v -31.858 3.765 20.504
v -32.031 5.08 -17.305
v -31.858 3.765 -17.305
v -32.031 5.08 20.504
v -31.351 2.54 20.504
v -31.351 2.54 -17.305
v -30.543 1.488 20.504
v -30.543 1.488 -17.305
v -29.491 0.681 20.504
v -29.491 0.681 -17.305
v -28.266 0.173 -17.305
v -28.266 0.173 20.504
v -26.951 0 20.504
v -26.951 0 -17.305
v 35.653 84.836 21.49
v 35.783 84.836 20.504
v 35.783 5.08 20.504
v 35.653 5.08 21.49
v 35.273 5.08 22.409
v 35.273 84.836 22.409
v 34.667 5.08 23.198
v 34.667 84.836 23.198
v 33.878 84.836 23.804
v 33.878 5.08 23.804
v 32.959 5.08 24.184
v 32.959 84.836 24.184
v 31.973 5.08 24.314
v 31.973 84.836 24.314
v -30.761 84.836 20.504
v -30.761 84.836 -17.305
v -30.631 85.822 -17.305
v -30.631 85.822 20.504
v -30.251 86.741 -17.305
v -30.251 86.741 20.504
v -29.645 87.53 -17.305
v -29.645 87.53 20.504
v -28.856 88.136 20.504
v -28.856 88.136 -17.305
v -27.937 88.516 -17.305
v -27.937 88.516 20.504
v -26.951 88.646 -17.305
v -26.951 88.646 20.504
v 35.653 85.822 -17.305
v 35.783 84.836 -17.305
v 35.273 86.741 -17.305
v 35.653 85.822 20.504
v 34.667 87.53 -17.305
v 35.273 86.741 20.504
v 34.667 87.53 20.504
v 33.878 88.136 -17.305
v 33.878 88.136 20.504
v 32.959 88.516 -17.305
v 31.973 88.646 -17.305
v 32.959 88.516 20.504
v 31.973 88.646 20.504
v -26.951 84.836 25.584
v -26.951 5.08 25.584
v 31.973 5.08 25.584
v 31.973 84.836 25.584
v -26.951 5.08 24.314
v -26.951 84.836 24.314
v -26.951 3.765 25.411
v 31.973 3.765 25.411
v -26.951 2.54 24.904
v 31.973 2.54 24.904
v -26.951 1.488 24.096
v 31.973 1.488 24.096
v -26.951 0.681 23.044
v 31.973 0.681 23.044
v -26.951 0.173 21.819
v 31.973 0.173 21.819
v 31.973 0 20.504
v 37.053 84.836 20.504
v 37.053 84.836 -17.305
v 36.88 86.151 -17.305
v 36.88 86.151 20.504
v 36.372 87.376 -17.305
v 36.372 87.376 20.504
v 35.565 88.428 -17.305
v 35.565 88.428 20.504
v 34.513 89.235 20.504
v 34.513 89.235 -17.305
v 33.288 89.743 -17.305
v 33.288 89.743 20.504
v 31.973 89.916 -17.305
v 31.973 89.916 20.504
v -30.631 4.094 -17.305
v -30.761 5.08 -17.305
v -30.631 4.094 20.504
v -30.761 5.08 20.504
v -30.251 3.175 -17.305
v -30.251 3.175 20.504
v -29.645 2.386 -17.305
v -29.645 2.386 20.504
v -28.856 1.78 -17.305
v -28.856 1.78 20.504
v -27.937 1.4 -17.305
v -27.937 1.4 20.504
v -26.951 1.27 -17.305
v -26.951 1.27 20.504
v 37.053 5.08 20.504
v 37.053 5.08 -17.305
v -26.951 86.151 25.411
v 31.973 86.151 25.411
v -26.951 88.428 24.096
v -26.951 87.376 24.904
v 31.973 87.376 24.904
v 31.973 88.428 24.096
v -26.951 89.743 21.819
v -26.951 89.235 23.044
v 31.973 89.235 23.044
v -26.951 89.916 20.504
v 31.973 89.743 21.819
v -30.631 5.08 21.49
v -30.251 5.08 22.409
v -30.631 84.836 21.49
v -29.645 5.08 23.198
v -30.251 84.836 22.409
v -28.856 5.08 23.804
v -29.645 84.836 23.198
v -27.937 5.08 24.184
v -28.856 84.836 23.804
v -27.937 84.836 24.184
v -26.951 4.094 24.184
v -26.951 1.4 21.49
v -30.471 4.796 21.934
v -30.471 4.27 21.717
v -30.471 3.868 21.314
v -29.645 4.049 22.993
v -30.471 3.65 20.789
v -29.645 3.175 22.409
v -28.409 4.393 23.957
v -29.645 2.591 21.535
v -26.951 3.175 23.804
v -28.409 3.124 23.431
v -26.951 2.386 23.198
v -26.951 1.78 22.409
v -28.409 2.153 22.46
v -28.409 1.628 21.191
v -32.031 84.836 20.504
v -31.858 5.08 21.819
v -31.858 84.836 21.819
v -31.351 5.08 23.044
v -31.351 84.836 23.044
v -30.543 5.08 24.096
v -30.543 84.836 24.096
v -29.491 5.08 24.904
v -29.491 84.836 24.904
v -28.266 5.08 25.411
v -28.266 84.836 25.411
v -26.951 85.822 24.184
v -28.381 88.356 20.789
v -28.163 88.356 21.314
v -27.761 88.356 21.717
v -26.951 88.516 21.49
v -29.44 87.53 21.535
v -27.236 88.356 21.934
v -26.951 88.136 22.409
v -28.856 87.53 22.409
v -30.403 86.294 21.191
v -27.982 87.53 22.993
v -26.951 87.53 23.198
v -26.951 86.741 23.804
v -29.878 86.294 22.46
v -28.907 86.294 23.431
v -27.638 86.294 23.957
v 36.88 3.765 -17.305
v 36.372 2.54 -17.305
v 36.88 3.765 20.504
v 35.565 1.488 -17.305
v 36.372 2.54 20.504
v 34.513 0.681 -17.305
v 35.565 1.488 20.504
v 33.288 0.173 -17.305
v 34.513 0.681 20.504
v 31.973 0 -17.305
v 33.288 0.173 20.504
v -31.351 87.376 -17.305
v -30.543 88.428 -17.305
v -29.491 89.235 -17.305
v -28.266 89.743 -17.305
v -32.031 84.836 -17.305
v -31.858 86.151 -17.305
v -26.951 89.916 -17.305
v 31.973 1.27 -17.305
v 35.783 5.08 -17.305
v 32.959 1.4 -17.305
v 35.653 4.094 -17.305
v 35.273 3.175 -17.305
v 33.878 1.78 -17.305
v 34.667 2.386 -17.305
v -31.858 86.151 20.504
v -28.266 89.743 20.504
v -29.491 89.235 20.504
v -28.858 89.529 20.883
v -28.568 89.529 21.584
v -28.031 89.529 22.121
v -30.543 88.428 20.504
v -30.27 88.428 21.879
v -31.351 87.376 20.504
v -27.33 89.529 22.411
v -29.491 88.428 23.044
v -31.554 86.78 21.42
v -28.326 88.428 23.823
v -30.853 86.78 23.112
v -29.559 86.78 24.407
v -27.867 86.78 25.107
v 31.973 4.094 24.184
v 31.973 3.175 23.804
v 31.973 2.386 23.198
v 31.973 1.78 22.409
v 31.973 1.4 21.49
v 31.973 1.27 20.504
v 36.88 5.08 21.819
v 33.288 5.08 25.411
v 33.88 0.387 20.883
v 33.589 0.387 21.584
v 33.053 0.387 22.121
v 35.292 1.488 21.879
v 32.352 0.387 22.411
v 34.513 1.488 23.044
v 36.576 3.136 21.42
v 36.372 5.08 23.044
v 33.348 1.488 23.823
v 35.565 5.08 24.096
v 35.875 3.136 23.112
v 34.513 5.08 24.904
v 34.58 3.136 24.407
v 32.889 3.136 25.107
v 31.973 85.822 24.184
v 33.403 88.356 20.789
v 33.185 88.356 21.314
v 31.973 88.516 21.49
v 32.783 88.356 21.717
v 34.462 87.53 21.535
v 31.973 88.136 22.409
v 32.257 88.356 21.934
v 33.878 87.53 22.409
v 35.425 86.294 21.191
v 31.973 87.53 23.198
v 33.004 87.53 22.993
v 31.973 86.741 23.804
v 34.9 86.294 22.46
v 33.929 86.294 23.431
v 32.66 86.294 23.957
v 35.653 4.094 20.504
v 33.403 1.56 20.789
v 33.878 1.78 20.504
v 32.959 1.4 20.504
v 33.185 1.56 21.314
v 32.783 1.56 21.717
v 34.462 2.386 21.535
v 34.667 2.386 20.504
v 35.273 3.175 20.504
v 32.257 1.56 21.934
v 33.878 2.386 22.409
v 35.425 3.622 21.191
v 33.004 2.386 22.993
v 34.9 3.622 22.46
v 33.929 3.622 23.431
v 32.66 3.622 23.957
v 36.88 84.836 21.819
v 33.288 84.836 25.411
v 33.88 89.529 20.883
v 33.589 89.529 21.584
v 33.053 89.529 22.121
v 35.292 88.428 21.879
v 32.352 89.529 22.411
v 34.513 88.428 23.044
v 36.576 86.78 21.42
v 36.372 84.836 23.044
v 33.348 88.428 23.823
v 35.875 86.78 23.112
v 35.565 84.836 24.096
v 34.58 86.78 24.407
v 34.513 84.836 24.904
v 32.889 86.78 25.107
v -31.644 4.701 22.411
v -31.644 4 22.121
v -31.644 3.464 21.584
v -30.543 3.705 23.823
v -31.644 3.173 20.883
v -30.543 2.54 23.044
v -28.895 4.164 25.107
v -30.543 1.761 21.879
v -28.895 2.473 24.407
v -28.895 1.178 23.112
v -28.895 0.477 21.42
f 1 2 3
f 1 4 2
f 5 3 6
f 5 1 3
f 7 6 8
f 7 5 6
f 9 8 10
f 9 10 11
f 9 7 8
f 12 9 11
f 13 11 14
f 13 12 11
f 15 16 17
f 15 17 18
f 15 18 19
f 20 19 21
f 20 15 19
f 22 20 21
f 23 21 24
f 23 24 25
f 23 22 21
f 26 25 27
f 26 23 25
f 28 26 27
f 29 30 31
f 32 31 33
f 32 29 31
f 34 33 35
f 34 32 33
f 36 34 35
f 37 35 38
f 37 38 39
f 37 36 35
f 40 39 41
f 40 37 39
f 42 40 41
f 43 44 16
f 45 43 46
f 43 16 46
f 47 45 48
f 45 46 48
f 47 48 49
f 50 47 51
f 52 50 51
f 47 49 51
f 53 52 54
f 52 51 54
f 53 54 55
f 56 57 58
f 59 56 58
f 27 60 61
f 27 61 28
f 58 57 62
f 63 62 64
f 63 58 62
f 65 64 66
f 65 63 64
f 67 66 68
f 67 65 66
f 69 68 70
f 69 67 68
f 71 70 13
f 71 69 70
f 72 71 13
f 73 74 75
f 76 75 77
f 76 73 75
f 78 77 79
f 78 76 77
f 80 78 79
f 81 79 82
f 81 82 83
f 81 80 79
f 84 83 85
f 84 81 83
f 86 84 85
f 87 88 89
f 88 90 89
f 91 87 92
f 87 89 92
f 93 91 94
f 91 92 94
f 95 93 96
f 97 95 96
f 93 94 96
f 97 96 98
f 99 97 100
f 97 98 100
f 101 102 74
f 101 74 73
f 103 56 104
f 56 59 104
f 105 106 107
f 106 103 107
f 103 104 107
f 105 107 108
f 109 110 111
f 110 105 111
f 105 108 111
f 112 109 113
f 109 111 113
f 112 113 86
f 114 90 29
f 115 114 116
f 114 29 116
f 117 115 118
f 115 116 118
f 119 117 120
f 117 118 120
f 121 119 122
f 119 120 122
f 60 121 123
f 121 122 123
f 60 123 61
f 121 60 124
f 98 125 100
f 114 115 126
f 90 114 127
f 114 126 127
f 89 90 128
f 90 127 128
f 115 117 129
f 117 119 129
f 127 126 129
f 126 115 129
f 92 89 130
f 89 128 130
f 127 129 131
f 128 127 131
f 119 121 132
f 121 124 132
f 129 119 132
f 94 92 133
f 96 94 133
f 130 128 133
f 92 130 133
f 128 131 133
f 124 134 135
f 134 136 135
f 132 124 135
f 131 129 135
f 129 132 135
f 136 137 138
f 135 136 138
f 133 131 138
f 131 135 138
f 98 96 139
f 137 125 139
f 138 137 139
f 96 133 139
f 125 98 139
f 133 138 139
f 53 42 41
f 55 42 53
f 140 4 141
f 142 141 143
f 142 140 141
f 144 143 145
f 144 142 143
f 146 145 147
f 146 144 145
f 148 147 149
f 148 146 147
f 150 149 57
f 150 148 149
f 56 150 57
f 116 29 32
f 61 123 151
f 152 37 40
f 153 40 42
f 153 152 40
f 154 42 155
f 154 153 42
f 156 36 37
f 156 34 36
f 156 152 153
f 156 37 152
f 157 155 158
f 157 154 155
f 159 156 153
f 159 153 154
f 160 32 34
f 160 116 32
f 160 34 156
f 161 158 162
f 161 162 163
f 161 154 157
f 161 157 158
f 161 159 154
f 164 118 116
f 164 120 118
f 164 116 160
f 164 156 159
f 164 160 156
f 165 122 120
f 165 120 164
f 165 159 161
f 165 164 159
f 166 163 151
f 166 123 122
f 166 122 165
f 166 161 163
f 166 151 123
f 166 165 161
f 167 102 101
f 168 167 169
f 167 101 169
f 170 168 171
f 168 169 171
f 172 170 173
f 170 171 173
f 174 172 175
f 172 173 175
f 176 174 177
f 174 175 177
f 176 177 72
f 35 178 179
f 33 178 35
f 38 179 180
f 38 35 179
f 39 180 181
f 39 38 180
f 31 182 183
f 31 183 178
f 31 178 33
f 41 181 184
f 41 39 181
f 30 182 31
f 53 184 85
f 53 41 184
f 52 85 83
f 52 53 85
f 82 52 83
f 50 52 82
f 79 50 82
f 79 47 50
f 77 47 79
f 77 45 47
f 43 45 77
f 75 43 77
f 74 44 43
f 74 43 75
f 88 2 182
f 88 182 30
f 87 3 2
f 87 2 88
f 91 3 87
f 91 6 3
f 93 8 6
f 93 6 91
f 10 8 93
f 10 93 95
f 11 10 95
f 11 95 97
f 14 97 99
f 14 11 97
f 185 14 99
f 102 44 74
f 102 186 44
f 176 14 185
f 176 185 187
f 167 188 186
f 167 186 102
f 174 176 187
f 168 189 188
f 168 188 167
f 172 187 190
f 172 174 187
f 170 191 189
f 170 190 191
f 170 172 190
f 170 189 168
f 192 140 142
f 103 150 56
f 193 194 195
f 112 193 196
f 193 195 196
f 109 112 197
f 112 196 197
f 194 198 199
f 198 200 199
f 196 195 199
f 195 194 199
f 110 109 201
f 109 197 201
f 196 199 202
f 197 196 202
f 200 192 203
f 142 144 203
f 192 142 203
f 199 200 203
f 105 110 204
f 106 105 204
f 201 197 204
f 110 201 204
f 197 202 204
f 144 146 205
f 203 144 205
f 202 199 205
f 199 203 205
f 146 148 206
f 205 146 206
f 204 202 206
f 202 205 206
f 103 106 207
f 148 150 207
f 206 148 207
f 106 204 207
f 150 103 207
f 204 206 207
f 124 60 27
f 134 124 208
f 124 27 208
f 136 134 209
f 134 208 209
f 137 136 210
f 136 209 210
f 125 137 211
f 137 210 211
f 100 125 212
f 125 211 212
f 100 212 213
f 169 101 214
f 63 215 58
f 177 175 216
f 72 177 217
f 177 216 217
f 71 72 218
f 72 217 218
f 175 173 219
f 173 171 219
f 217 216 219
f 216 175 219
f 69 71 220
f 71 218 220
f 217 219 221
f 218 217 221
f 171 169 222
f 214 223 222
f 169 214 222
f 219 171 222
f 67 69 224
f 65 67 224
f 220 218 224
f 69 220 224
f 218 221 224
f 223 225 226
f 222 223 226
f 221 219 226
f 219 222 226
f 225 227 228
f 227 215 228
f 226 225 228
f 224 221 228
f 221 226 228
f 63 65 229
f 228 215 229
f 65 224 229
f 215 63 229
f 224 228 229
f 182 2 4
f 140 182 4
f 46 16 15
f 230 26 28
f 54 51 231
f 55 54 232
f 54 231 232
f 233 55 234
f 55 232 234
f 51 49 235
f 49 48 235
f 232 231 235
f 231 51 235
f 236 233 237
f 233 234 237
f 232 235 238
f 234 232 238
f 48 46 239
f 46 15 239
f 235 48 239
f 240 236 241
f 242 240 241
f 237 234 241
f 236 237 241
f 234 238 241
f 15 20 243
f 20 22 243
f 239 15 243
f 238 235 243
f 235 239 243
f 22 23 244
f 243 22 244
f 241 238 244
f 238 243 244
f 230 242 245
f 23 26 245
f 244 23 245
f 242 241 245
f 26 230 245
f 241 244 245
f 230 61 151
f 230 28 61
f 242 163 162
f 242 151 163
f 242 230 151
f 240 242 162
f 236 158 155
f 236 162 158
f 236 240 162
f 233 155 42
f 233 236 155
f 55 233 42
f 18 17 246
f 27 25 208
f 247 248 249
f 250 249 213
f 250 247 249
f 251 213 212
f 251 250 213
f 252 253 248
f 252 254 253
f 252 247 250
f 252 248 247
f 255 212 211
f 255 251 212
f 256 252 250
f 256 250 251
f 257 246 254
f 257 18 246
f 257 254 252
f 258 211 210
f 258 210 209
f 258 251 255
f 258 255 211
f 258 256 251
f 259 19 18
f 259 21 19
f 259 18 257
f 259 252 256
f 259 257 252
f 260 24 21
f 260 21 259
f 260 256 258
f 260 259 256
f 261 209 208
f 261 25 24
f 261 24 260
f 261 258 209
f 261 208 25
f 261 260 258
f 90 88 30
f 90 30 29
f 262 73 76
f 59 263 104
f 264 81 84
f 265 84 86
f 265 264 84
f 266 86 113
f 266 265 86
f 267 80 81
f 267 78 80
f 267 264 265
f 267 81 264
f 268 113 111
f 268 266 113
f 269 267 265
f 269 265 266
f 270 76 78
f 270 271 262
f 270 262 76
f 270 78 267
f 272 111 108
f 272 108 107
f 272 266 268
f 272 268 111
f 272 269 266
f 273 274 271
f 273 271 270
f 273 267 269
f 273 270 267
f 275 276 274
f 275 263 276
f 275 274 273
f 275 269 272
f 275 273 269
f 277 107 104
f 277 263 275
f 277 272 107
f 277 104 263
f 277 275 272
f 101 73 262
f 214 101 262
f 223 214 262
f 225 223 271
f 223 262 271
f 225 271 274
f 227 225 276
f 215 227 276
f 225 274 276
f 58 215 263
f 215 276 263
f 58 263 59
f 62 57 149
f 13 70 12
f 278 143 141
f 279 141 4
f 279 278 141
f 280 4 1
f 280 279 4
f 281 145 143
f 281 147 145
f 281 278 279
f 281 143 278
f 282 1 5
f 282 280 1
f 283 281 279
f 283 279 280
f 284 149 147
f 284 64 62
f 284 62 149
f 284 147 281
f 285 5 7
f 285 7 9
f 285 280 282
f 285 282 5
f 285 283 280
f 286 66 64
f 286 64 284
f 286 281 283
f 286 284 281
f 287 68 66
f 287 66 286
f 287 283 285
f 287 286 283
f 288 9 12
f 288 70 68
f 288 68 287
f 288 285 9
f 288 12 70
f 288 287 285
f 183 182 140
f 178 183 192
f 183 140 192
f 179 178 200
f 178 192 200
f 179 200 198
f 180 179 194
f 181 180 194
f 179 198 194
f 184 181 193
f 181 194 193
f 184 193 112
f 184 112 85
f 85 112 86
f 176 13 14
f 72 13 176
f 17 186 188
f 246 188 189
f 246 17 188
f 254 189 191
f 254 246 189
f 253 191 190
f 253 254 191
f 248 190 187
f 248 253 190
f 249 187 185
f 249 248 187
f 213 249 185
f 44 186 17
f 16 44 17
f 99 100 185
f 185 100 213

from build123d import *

# Parameters (mm, degrees)
F0_W     = 69.084123
F0_H     = 42.889162
F1_DEPTH = 89.916
F2_R     = 5.08
F3_T     = -1.27


with BuildPart() as f1:
    # F0 (on Front) → F1 (new body)
    with BuildSketch(Plane.XZ):
        with Locations((2.510917, 4.139618)):
            Rectangle(F0_W, F0_H)
    extrude(amount=-F1_DEPTH)

    # F2
    f2_edges = [f1.edges().sort_by_distance(p)[0] for p in [
        (37.052978, 44.958, 25.584199),
        (37.052978, 0, 4.139618),
        (2.510916, 0, 25.584199),
        (-32.031145, 44.958, 25.584199),
        (-32.031145, 0, 4.139618),
        (-32.031145, 89.916, 4.139618),
        (37.052978, 89.916, 4.139618),
        (2.510916, 89.916, 25.584199),
    ]]
    fillet(f2_edges, radius=F2_R)

    # F3
    f3_openings = [f1.faces().sort_by_distance(p)[0] for p in [
        (2.510916, 44.958, -17.304963),
    ]]
    offset(amount=F3_T, openings=f3_openings)


solid = f1.part
